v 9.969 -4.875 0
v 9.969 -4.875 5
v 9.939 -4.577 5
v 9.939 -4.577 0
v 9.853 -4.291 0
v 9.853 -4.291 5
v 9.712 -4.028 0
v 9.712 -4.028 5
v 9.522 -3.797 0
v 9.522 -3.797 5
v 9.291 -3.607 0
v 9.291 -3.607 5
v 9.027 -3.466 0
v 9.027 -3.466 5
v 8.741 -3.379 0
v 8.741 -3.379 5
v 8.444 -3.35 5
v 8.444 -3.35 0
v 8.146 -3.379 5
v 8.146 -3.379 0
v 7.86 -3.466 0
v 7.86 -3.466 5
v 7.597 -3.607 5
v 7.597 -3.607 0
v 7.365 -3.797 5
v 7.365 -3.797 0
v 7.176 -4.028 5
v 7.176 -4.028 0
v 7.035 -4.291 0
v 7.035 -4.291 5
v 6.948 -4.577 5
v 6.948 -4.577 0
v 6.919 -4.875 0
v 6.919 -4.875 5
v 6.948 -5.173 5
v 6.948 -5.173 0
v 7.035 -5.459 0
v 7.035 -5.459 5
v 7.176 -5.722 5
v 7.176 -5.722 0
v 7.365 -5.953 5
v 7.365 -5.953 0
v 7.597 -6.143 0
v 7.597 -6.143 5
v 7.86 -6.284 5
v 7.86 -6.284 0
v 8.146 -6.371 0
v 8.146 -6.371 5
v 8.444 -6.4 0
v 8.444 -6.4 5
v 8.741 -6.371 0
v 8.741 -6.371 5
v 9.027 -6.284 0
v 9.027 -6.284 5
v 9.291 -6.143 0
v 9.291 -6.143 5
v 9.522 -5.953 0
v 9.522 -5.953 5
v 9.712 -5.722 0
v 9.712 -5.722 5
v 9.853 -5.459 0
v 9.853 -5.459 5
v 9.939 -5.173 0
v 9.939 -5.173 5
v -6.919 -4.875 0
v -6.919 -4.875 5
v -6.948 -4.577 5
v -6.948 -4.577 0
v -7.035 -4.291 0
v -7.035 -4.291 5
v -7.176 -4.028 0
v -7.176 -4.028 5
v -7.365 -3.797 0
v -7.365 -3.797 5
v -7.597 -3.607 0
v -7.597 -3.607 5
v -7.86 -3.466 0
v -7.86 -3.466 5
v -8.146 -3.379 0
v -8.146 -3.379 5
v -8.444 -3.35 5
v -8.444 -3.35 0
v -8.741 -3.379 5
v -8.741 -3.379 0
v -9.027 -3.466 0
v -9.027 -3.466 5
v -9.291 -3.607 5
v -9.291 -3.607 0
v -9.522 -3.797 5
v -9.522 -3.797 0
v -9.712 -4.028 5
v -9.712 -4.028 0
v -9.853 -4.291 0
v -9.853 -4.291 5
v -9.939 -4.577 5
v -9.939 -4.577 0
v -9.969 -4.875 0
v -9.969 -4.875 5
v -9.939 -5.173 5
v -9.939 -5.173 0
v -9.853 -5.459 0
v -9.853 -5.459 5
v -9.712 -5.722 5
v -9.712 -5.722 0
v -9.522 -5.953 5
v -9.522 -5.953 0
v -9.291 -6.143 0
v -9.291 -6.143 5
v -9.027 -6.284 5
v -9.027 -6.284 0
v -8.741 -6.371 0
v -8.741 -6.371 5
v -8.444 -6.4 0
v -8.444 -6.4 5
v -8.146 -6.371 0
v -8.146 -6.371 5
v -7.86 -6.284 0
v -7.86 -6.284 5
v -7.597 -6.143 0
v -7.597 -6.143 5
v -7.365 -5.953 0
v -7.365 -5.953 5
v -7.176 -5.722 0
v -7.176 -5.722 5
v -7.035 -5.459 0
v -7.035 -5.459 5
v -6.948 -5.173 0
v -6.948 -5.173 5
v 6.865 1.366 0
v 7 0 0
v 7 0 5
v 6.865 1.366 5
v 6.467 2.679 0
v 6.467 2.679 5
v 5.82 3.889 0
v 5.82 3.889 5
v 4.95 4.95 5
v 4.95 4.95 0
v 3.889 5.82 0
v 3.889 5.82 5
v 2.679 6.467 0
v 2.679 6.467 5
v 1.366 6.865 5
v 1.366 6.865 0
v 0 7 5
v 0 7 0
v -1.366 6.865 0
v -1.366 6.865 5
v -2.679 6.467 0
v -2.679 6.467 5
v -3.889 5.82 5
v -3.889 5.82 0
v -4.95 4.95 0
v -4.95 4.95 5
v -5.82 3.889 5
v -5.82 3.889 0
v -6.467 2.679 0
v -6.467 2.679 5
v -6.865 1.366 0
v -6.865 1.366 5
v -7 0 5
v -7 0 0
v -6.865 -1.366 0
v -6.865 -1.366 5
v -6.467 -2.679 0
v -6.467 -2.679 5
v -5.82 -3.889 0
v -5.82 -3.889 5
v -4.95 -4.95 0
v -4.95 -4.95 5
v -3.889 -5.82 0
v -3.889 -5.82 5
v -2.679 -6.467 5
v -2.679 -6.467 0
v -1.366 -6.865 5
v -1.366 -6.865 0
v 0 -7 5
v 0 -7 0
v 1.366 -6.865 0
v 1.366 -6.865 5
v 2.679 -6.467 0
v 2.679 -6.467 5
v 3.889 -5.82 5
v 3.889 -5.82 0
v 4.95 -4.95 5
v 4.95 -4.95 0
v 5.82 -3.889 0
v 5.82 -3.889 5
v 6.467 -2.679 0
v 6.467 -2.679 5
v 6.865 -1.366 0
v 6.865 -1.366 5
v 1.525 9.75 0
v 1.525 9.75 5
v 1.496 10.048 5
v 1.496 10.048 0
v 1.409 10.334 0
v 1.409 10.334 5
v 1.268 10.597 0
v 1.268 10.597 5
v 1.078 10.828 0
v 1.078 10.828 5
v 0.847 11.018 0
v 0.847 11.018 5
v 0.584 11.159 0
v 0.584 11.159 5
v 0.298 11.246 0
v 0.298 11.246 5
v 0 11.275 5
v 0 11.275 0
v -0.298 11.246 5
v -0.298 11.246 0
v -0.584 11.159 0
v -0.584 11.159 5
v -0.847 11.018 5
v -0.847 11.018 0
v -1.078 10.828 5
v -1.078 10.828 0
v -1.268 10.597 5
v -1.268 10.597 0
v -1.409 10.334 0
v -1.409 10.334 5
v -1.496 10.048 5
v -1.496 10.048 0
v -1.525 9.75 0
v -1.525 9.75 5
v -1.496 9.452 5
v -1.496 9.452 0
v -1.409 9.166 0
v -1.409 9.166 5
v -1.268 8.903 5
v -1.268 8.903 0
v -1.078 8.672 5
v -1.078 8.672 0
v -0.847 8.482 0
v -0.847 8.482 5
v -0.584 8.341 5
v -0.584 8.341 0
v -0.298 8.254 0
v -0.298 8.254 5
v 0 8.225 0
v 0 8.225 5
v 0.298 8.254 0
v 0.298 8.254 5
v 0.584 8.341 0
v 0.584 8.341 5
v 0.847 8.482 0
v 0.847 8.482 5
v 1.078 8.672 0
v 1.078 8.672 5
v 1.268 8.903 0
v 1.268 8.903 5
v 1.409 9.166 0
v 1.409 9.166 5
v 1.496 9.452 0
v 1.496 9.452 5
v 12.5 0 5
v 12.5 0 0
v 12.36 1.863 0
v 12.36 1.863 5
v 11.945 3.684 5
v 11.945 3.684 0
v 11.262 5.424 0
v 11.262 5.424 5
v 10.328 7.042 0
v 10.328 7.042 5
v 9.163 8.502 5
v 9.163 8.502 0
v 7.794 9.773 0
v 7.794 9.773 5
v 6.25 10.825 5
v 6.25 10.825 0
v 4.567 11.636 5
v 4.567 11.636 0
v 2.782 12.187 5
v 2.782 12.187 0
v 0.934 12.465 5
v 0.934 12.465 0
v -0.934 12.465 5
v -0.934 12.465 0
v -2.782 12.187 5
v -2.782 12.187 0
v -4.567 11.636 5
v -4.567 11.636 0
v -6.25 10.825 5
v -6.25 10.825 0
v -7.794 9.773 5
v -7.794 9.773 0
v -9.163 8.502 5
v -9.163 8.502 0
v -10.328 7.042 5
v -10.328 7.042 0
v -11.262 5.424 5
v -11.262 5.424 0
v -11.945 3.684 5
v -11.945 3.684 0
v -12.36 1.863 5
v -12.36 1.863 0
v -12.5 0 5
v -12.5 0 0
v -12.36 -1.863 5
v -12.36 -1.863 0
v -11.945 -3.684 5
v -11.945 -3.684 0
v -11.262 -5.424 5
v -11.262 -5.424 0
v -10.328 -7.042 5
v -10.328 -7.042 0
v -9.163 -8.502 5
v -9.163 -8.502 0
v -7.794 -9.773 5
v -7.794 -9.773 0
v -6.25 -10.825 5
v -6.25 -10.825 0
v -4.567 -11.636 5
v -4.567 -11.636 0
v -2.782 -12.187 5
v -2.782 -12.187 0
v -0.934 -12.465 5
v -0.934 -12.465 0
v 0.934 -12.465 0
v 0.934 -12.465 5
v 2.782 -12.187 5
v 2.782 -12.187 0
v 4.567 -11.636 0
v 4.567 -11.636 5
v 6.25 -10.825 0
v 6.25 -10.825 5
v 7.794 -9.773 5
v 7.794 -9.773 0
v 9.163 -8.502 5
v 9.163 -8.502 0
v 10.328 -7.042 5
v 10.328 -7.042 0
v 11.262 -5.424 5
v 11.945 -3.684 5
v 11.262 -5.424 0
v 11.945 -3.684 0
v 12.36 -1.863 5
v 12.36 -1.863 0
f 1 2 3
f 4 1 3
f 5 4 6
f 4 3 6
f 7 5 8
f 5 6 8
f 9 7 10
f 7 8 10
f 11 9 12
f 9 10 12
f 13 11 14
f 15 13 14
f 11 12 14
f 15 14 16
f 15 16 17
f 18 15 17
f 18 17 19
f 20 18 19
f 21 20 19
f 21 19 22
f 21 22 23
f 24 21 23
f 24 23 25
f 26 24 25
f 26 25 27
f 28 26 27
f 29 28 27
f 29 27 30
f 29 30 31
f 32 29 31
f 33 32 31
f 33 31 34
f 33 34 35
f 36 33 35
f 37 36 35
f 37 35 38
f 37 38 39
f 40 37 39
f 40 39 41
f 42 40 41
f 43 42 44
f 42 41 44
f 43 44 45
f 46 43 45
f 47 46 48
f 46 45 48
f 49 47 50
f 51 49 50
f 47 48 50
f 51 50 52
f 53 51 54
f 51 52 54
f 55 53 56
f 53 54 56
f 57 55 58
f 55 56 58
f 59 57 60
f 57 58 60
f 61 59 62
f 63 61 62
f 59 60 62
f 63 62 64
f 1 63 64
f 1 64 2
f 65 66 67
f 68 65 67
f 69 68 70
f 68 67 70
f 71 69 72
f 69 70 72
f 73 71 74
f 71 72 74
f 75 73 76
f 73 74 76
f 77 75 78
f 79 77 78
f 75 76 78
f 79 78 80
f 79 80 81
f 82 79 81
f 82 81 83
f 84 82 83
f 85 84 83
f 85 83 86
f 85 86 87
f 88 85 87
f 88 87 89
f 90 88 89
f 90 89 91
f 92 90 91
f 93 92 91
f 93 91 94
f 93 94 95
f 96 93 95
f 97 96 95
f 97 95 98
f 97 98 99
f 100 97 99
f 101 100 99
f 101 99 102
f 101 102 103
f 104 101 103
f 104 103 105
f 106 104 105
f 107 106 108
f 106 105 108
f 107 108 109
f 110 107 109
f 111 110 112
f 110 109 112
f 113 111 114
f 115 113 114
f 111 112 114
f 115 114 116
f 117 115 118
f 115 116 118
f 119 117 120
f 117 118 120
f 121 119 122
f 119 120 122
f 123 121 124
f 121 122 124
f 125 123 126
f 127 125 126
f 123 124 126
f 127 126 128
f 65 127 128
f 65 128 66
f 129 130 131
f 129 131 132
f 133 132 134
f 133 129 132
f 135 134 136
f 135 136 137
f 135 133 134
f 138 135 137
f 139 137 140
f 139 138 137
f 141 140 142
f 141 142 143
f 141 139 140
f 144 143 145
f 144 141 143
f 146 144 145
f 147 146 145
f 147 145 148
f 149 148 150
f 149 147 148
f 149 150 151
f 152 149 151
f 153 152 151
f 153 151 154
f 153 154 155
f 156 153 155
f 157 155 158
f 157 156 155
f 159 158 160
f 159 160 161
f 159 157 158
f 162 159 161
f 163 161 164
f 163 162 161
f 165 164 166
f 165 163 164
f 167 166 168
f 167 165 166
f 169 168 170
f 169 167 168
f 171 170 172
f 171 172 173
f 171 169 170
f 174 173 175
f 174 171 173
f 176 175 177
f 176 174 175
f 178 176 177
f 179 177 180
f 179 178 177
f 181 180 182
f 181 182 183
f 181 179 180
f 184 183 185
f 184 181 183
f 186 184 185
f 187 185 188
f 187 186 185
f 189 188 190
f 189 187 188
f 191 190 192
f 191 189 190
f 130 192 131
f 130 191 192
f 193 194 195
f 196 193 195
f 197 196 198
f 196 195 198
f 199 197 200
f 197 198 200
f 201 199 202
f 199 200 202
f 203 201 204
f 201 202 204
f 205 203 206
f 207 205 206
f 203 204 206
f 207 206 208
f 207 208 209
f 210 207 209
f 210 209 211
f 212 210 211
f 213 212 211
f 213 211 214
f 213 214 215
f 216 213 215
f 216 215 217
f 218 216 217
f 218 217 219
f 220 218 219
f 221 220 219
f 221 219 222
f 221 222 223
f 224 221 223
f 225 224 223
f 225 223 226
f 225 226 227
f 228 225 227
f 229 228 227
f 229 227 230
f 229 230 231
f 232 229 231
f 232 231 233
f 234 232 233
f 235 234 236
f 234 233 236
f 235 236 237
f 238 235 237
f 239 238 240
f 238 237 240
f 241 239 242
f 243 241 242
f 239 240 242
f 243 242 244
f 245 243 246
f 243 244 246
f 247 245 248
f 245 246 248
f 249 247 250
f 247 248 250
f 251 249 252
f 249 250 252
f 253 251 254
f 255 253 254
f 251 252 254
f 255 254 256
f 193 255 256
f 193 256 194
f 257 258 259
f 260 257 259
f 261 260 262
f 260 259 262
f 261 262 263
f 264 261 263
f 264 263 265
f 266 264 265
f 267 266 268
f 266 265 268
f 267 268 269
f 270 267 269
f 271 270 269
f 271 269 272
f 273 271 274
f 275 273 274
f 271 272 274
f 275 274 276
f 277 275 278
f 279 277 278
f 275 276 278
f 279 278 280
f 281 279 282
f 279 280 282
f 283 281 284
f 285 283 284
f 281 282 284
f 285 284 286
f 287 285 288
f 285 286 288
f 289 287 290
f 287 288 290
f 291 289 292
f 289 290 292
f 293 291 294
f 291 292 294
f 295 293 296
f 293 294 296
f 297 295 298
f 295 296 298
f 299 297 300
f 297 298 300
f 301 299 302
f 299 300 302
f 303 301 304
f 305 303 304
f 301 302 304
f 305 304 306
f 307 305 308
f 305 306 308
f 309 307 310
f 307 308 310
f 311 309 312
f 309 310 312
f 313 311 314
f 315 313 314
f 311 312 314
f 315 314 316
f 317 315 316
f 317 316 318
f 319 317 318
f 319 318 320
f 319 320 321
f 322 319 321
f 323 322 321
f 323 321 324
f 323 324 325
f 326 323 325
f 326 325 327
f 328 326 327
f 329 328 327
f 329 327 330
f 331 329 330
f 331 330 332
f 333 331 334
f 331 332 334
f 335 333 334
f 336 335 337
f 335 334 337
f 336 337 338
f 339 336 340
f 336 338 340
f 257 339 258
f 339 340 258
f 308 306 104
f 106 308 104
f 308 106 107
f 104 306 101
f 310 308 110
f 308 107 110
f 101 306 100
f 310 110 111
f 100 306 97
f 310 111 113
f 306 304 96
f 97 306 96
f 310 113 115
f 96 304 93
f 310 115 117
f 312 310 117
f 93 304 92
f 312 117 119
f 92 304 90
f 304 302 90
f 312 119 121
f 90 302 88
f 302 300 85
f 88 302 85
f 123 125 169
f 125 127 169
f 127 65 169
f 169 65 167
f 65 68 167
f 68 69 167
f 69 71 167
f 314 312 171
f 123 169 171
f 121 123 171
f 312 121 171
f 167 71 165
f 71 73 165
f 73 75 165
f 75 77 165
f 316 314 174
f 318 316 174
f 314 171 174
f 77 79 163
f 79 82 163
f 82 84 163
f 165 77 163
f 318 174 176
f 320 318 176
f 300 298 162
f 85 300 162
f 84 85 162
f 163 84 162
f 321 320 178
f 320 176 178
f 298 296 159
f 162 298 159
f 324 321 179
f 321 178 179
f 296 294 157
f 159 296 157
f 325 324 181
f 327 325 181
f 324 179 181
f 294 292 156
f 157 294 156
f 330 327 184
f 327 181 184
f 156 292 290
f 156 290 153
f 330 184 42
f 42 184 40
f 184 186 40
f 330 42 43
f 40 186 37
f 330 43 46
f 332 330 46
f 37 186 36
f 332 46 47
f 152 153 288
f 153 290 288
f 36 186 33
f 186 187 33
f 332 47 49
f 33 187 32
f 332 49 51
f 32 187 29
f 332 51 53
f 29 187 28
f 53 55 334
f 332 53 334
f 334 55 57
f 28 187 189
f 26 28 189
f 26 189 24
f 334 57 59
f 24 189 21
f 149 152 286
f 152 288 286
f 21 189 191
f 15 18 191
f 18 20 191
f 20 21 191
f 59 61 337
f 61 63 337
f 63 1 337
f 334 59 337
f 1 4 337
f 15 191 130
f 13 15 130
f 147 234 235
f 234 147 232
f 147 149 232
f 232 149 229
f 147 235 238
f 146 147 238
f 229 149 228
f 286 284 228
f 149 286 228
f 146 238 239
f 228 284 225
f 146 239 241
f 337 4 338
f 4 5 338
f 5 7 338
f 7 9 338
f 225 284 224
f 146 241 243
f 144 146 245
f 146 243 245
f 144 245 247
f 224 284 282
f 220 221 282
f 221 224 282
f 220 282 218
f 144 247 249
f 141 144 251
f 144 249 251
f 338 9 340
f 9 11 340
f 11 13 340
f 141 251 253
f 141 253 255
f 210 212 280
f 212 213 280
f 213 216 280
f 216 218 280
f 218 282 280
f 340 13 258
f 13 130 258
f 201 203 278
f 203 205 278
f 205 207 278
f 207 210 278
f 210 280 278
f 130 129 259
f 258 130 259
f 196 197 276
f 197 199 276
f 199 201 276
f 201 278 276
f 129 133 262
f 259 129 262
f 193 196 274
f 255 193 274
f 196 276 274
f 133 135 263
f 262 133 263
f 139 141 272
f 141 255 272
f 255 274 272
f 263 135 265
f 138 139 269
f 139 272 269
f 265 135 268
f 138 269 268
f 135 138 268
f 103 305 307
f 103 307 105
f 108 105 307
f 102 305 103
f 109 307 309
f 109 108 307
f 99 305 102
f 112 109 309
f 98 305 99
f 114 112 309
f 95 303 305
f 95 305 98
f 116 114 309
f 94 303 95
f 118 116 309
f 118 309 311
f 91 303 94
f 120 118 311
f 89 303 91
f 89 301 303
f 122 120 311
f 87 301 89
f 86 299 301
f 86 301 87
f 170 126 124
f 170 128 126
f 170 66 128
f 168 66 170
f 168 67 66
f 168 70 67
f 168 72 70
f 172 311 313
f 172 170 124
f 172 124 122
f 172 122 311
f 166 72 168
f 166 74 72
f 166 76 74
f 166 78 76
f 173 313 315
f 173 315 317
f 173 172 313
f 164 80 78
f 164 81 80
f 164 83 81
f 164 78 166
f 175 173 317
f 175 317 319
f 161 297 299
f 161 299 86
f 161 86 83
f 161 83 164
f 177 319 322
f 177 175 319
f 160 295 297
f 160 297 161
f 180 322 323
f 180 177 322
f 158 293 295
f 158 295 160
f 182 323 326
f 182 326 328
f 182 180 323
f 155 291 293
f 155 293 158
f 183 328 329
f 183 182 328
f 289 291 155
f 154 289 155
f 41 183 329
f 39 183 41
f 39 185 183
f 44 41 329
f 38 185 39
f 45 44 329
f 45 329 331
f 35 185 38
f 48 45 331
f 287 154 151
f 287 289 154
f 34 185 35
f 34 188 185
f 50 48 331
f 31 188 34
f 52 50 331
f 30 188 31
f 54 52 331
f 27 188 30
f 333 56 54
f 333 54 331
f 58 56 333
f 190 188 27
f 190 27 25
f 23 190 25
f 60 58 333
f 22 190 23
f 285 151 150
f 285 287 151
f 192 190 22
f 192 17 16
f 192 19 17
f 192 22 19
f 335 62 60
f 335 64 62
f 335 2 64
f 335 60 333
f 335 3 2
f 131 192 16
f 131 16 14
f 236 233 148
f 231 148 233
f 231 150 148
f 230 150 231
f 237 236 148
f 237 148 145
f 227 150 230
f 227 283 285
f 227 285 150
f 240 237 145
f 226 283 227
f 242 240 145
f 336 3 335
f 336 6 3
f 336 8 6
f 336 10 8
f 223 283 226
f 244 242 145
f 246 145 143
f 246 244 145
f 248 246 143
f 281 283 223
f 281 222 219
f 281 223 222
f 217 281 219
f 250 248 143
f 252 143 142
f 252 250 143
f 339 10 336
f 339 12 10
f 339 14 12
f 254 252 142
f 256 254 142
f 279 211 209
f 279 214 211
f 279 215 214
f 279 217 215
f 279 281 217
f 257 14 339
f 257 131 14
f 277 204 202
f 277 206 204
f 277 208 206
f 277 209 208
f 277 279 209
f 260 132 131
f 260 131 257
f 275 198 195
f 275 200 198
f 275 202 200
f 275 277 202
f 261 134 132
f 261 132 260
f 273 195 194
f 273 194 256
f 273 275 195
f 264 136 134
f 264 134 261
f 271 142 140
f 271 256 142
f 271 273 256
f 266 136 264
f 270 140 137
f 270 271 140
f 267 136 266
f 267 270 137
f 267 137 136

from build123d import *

# Parameters (mm, degrees)
SKETCH1_R           = 12.5
SKETCH1_R_2         = 7
BOSS_EXTRUDE1_DEPTH = 5
CUT_EXTRUDE1_REACH  = 20.371
SKETCH2_R           = 1.525


with BuildPart() as part:
    # Sketch1 → Boss-Extrude1 (new body)
    with BuildSketch(Plane.XY):
        Circle(SKETCH1_R)
        Circle(SKETCH1_R_2, mode=Mode.SUBTRACT)
    extrude(amount=BOSS_EXTRUDE1_DEPTH)

    # Sketch2 → Cut-Extrude1 (cut, up to next)
    with BuildSketch(Plane.XY.offset(5), mode=Mode.PRIVATE) as cut_extrude1_sk1:
        with Locations((0, 9.75)):
            Circle(SKETCH2_R)
    cut_extrude1_tool1 = extrude(cut_extrude1_sk1.sketch, amount=-CUT_EXTRUDE1_REACH, mode=Mode.PRIVATE) & part.part
    # Sketch2 → Cut-Extrude1 (cut, up to next)
    with BuildSketch(Plane.XY.offset(5), mode=Mode.PRIVATE) as cut_extrude1_sk2:
        with Locations((8.443747687, -4.875)):
            Circle(SKETCH2_R)
    cut_extrude1_tool2 = extrude(cut_extrude1_sk2.sketch, amount=-CUT_EXTRUDE1_REACH, mode=Mode.PRIVATE) & part.part
    # Sketch2 → Cut-Extrude1 (cut, up to next)
    with BuildSketch(Plane.XY.offset(5), mode=Mode.PRIVATE) as cut_extrude1_sk3:
        with Locations((-8.443747687, -4.875)):
            Circle(SKETCH2_R)
    cut_extrude1_tool3 = extrude(cut_extrude1_sk3.sketch, amount=-CUT_EXTRUDE1_REACH, mode=Mode.PRIVATE) & part.part
    add(cut_extrude1_tool1.solids().sort_by_distance((0, 9.75, 5))[0], mode=Mode.SUBTRACT)
    add(cut_extrude1_tool2.solids().sort_by_distance((8.443748, -4.875, 5))[0], mode=Mode.SUBTRACT)
    add(cut_extrude1_tool3.solids().sort_by_distance((-8.443748, -4.875, 5))[0], mode=Mode.SUBTRACT)


solid = part.part
